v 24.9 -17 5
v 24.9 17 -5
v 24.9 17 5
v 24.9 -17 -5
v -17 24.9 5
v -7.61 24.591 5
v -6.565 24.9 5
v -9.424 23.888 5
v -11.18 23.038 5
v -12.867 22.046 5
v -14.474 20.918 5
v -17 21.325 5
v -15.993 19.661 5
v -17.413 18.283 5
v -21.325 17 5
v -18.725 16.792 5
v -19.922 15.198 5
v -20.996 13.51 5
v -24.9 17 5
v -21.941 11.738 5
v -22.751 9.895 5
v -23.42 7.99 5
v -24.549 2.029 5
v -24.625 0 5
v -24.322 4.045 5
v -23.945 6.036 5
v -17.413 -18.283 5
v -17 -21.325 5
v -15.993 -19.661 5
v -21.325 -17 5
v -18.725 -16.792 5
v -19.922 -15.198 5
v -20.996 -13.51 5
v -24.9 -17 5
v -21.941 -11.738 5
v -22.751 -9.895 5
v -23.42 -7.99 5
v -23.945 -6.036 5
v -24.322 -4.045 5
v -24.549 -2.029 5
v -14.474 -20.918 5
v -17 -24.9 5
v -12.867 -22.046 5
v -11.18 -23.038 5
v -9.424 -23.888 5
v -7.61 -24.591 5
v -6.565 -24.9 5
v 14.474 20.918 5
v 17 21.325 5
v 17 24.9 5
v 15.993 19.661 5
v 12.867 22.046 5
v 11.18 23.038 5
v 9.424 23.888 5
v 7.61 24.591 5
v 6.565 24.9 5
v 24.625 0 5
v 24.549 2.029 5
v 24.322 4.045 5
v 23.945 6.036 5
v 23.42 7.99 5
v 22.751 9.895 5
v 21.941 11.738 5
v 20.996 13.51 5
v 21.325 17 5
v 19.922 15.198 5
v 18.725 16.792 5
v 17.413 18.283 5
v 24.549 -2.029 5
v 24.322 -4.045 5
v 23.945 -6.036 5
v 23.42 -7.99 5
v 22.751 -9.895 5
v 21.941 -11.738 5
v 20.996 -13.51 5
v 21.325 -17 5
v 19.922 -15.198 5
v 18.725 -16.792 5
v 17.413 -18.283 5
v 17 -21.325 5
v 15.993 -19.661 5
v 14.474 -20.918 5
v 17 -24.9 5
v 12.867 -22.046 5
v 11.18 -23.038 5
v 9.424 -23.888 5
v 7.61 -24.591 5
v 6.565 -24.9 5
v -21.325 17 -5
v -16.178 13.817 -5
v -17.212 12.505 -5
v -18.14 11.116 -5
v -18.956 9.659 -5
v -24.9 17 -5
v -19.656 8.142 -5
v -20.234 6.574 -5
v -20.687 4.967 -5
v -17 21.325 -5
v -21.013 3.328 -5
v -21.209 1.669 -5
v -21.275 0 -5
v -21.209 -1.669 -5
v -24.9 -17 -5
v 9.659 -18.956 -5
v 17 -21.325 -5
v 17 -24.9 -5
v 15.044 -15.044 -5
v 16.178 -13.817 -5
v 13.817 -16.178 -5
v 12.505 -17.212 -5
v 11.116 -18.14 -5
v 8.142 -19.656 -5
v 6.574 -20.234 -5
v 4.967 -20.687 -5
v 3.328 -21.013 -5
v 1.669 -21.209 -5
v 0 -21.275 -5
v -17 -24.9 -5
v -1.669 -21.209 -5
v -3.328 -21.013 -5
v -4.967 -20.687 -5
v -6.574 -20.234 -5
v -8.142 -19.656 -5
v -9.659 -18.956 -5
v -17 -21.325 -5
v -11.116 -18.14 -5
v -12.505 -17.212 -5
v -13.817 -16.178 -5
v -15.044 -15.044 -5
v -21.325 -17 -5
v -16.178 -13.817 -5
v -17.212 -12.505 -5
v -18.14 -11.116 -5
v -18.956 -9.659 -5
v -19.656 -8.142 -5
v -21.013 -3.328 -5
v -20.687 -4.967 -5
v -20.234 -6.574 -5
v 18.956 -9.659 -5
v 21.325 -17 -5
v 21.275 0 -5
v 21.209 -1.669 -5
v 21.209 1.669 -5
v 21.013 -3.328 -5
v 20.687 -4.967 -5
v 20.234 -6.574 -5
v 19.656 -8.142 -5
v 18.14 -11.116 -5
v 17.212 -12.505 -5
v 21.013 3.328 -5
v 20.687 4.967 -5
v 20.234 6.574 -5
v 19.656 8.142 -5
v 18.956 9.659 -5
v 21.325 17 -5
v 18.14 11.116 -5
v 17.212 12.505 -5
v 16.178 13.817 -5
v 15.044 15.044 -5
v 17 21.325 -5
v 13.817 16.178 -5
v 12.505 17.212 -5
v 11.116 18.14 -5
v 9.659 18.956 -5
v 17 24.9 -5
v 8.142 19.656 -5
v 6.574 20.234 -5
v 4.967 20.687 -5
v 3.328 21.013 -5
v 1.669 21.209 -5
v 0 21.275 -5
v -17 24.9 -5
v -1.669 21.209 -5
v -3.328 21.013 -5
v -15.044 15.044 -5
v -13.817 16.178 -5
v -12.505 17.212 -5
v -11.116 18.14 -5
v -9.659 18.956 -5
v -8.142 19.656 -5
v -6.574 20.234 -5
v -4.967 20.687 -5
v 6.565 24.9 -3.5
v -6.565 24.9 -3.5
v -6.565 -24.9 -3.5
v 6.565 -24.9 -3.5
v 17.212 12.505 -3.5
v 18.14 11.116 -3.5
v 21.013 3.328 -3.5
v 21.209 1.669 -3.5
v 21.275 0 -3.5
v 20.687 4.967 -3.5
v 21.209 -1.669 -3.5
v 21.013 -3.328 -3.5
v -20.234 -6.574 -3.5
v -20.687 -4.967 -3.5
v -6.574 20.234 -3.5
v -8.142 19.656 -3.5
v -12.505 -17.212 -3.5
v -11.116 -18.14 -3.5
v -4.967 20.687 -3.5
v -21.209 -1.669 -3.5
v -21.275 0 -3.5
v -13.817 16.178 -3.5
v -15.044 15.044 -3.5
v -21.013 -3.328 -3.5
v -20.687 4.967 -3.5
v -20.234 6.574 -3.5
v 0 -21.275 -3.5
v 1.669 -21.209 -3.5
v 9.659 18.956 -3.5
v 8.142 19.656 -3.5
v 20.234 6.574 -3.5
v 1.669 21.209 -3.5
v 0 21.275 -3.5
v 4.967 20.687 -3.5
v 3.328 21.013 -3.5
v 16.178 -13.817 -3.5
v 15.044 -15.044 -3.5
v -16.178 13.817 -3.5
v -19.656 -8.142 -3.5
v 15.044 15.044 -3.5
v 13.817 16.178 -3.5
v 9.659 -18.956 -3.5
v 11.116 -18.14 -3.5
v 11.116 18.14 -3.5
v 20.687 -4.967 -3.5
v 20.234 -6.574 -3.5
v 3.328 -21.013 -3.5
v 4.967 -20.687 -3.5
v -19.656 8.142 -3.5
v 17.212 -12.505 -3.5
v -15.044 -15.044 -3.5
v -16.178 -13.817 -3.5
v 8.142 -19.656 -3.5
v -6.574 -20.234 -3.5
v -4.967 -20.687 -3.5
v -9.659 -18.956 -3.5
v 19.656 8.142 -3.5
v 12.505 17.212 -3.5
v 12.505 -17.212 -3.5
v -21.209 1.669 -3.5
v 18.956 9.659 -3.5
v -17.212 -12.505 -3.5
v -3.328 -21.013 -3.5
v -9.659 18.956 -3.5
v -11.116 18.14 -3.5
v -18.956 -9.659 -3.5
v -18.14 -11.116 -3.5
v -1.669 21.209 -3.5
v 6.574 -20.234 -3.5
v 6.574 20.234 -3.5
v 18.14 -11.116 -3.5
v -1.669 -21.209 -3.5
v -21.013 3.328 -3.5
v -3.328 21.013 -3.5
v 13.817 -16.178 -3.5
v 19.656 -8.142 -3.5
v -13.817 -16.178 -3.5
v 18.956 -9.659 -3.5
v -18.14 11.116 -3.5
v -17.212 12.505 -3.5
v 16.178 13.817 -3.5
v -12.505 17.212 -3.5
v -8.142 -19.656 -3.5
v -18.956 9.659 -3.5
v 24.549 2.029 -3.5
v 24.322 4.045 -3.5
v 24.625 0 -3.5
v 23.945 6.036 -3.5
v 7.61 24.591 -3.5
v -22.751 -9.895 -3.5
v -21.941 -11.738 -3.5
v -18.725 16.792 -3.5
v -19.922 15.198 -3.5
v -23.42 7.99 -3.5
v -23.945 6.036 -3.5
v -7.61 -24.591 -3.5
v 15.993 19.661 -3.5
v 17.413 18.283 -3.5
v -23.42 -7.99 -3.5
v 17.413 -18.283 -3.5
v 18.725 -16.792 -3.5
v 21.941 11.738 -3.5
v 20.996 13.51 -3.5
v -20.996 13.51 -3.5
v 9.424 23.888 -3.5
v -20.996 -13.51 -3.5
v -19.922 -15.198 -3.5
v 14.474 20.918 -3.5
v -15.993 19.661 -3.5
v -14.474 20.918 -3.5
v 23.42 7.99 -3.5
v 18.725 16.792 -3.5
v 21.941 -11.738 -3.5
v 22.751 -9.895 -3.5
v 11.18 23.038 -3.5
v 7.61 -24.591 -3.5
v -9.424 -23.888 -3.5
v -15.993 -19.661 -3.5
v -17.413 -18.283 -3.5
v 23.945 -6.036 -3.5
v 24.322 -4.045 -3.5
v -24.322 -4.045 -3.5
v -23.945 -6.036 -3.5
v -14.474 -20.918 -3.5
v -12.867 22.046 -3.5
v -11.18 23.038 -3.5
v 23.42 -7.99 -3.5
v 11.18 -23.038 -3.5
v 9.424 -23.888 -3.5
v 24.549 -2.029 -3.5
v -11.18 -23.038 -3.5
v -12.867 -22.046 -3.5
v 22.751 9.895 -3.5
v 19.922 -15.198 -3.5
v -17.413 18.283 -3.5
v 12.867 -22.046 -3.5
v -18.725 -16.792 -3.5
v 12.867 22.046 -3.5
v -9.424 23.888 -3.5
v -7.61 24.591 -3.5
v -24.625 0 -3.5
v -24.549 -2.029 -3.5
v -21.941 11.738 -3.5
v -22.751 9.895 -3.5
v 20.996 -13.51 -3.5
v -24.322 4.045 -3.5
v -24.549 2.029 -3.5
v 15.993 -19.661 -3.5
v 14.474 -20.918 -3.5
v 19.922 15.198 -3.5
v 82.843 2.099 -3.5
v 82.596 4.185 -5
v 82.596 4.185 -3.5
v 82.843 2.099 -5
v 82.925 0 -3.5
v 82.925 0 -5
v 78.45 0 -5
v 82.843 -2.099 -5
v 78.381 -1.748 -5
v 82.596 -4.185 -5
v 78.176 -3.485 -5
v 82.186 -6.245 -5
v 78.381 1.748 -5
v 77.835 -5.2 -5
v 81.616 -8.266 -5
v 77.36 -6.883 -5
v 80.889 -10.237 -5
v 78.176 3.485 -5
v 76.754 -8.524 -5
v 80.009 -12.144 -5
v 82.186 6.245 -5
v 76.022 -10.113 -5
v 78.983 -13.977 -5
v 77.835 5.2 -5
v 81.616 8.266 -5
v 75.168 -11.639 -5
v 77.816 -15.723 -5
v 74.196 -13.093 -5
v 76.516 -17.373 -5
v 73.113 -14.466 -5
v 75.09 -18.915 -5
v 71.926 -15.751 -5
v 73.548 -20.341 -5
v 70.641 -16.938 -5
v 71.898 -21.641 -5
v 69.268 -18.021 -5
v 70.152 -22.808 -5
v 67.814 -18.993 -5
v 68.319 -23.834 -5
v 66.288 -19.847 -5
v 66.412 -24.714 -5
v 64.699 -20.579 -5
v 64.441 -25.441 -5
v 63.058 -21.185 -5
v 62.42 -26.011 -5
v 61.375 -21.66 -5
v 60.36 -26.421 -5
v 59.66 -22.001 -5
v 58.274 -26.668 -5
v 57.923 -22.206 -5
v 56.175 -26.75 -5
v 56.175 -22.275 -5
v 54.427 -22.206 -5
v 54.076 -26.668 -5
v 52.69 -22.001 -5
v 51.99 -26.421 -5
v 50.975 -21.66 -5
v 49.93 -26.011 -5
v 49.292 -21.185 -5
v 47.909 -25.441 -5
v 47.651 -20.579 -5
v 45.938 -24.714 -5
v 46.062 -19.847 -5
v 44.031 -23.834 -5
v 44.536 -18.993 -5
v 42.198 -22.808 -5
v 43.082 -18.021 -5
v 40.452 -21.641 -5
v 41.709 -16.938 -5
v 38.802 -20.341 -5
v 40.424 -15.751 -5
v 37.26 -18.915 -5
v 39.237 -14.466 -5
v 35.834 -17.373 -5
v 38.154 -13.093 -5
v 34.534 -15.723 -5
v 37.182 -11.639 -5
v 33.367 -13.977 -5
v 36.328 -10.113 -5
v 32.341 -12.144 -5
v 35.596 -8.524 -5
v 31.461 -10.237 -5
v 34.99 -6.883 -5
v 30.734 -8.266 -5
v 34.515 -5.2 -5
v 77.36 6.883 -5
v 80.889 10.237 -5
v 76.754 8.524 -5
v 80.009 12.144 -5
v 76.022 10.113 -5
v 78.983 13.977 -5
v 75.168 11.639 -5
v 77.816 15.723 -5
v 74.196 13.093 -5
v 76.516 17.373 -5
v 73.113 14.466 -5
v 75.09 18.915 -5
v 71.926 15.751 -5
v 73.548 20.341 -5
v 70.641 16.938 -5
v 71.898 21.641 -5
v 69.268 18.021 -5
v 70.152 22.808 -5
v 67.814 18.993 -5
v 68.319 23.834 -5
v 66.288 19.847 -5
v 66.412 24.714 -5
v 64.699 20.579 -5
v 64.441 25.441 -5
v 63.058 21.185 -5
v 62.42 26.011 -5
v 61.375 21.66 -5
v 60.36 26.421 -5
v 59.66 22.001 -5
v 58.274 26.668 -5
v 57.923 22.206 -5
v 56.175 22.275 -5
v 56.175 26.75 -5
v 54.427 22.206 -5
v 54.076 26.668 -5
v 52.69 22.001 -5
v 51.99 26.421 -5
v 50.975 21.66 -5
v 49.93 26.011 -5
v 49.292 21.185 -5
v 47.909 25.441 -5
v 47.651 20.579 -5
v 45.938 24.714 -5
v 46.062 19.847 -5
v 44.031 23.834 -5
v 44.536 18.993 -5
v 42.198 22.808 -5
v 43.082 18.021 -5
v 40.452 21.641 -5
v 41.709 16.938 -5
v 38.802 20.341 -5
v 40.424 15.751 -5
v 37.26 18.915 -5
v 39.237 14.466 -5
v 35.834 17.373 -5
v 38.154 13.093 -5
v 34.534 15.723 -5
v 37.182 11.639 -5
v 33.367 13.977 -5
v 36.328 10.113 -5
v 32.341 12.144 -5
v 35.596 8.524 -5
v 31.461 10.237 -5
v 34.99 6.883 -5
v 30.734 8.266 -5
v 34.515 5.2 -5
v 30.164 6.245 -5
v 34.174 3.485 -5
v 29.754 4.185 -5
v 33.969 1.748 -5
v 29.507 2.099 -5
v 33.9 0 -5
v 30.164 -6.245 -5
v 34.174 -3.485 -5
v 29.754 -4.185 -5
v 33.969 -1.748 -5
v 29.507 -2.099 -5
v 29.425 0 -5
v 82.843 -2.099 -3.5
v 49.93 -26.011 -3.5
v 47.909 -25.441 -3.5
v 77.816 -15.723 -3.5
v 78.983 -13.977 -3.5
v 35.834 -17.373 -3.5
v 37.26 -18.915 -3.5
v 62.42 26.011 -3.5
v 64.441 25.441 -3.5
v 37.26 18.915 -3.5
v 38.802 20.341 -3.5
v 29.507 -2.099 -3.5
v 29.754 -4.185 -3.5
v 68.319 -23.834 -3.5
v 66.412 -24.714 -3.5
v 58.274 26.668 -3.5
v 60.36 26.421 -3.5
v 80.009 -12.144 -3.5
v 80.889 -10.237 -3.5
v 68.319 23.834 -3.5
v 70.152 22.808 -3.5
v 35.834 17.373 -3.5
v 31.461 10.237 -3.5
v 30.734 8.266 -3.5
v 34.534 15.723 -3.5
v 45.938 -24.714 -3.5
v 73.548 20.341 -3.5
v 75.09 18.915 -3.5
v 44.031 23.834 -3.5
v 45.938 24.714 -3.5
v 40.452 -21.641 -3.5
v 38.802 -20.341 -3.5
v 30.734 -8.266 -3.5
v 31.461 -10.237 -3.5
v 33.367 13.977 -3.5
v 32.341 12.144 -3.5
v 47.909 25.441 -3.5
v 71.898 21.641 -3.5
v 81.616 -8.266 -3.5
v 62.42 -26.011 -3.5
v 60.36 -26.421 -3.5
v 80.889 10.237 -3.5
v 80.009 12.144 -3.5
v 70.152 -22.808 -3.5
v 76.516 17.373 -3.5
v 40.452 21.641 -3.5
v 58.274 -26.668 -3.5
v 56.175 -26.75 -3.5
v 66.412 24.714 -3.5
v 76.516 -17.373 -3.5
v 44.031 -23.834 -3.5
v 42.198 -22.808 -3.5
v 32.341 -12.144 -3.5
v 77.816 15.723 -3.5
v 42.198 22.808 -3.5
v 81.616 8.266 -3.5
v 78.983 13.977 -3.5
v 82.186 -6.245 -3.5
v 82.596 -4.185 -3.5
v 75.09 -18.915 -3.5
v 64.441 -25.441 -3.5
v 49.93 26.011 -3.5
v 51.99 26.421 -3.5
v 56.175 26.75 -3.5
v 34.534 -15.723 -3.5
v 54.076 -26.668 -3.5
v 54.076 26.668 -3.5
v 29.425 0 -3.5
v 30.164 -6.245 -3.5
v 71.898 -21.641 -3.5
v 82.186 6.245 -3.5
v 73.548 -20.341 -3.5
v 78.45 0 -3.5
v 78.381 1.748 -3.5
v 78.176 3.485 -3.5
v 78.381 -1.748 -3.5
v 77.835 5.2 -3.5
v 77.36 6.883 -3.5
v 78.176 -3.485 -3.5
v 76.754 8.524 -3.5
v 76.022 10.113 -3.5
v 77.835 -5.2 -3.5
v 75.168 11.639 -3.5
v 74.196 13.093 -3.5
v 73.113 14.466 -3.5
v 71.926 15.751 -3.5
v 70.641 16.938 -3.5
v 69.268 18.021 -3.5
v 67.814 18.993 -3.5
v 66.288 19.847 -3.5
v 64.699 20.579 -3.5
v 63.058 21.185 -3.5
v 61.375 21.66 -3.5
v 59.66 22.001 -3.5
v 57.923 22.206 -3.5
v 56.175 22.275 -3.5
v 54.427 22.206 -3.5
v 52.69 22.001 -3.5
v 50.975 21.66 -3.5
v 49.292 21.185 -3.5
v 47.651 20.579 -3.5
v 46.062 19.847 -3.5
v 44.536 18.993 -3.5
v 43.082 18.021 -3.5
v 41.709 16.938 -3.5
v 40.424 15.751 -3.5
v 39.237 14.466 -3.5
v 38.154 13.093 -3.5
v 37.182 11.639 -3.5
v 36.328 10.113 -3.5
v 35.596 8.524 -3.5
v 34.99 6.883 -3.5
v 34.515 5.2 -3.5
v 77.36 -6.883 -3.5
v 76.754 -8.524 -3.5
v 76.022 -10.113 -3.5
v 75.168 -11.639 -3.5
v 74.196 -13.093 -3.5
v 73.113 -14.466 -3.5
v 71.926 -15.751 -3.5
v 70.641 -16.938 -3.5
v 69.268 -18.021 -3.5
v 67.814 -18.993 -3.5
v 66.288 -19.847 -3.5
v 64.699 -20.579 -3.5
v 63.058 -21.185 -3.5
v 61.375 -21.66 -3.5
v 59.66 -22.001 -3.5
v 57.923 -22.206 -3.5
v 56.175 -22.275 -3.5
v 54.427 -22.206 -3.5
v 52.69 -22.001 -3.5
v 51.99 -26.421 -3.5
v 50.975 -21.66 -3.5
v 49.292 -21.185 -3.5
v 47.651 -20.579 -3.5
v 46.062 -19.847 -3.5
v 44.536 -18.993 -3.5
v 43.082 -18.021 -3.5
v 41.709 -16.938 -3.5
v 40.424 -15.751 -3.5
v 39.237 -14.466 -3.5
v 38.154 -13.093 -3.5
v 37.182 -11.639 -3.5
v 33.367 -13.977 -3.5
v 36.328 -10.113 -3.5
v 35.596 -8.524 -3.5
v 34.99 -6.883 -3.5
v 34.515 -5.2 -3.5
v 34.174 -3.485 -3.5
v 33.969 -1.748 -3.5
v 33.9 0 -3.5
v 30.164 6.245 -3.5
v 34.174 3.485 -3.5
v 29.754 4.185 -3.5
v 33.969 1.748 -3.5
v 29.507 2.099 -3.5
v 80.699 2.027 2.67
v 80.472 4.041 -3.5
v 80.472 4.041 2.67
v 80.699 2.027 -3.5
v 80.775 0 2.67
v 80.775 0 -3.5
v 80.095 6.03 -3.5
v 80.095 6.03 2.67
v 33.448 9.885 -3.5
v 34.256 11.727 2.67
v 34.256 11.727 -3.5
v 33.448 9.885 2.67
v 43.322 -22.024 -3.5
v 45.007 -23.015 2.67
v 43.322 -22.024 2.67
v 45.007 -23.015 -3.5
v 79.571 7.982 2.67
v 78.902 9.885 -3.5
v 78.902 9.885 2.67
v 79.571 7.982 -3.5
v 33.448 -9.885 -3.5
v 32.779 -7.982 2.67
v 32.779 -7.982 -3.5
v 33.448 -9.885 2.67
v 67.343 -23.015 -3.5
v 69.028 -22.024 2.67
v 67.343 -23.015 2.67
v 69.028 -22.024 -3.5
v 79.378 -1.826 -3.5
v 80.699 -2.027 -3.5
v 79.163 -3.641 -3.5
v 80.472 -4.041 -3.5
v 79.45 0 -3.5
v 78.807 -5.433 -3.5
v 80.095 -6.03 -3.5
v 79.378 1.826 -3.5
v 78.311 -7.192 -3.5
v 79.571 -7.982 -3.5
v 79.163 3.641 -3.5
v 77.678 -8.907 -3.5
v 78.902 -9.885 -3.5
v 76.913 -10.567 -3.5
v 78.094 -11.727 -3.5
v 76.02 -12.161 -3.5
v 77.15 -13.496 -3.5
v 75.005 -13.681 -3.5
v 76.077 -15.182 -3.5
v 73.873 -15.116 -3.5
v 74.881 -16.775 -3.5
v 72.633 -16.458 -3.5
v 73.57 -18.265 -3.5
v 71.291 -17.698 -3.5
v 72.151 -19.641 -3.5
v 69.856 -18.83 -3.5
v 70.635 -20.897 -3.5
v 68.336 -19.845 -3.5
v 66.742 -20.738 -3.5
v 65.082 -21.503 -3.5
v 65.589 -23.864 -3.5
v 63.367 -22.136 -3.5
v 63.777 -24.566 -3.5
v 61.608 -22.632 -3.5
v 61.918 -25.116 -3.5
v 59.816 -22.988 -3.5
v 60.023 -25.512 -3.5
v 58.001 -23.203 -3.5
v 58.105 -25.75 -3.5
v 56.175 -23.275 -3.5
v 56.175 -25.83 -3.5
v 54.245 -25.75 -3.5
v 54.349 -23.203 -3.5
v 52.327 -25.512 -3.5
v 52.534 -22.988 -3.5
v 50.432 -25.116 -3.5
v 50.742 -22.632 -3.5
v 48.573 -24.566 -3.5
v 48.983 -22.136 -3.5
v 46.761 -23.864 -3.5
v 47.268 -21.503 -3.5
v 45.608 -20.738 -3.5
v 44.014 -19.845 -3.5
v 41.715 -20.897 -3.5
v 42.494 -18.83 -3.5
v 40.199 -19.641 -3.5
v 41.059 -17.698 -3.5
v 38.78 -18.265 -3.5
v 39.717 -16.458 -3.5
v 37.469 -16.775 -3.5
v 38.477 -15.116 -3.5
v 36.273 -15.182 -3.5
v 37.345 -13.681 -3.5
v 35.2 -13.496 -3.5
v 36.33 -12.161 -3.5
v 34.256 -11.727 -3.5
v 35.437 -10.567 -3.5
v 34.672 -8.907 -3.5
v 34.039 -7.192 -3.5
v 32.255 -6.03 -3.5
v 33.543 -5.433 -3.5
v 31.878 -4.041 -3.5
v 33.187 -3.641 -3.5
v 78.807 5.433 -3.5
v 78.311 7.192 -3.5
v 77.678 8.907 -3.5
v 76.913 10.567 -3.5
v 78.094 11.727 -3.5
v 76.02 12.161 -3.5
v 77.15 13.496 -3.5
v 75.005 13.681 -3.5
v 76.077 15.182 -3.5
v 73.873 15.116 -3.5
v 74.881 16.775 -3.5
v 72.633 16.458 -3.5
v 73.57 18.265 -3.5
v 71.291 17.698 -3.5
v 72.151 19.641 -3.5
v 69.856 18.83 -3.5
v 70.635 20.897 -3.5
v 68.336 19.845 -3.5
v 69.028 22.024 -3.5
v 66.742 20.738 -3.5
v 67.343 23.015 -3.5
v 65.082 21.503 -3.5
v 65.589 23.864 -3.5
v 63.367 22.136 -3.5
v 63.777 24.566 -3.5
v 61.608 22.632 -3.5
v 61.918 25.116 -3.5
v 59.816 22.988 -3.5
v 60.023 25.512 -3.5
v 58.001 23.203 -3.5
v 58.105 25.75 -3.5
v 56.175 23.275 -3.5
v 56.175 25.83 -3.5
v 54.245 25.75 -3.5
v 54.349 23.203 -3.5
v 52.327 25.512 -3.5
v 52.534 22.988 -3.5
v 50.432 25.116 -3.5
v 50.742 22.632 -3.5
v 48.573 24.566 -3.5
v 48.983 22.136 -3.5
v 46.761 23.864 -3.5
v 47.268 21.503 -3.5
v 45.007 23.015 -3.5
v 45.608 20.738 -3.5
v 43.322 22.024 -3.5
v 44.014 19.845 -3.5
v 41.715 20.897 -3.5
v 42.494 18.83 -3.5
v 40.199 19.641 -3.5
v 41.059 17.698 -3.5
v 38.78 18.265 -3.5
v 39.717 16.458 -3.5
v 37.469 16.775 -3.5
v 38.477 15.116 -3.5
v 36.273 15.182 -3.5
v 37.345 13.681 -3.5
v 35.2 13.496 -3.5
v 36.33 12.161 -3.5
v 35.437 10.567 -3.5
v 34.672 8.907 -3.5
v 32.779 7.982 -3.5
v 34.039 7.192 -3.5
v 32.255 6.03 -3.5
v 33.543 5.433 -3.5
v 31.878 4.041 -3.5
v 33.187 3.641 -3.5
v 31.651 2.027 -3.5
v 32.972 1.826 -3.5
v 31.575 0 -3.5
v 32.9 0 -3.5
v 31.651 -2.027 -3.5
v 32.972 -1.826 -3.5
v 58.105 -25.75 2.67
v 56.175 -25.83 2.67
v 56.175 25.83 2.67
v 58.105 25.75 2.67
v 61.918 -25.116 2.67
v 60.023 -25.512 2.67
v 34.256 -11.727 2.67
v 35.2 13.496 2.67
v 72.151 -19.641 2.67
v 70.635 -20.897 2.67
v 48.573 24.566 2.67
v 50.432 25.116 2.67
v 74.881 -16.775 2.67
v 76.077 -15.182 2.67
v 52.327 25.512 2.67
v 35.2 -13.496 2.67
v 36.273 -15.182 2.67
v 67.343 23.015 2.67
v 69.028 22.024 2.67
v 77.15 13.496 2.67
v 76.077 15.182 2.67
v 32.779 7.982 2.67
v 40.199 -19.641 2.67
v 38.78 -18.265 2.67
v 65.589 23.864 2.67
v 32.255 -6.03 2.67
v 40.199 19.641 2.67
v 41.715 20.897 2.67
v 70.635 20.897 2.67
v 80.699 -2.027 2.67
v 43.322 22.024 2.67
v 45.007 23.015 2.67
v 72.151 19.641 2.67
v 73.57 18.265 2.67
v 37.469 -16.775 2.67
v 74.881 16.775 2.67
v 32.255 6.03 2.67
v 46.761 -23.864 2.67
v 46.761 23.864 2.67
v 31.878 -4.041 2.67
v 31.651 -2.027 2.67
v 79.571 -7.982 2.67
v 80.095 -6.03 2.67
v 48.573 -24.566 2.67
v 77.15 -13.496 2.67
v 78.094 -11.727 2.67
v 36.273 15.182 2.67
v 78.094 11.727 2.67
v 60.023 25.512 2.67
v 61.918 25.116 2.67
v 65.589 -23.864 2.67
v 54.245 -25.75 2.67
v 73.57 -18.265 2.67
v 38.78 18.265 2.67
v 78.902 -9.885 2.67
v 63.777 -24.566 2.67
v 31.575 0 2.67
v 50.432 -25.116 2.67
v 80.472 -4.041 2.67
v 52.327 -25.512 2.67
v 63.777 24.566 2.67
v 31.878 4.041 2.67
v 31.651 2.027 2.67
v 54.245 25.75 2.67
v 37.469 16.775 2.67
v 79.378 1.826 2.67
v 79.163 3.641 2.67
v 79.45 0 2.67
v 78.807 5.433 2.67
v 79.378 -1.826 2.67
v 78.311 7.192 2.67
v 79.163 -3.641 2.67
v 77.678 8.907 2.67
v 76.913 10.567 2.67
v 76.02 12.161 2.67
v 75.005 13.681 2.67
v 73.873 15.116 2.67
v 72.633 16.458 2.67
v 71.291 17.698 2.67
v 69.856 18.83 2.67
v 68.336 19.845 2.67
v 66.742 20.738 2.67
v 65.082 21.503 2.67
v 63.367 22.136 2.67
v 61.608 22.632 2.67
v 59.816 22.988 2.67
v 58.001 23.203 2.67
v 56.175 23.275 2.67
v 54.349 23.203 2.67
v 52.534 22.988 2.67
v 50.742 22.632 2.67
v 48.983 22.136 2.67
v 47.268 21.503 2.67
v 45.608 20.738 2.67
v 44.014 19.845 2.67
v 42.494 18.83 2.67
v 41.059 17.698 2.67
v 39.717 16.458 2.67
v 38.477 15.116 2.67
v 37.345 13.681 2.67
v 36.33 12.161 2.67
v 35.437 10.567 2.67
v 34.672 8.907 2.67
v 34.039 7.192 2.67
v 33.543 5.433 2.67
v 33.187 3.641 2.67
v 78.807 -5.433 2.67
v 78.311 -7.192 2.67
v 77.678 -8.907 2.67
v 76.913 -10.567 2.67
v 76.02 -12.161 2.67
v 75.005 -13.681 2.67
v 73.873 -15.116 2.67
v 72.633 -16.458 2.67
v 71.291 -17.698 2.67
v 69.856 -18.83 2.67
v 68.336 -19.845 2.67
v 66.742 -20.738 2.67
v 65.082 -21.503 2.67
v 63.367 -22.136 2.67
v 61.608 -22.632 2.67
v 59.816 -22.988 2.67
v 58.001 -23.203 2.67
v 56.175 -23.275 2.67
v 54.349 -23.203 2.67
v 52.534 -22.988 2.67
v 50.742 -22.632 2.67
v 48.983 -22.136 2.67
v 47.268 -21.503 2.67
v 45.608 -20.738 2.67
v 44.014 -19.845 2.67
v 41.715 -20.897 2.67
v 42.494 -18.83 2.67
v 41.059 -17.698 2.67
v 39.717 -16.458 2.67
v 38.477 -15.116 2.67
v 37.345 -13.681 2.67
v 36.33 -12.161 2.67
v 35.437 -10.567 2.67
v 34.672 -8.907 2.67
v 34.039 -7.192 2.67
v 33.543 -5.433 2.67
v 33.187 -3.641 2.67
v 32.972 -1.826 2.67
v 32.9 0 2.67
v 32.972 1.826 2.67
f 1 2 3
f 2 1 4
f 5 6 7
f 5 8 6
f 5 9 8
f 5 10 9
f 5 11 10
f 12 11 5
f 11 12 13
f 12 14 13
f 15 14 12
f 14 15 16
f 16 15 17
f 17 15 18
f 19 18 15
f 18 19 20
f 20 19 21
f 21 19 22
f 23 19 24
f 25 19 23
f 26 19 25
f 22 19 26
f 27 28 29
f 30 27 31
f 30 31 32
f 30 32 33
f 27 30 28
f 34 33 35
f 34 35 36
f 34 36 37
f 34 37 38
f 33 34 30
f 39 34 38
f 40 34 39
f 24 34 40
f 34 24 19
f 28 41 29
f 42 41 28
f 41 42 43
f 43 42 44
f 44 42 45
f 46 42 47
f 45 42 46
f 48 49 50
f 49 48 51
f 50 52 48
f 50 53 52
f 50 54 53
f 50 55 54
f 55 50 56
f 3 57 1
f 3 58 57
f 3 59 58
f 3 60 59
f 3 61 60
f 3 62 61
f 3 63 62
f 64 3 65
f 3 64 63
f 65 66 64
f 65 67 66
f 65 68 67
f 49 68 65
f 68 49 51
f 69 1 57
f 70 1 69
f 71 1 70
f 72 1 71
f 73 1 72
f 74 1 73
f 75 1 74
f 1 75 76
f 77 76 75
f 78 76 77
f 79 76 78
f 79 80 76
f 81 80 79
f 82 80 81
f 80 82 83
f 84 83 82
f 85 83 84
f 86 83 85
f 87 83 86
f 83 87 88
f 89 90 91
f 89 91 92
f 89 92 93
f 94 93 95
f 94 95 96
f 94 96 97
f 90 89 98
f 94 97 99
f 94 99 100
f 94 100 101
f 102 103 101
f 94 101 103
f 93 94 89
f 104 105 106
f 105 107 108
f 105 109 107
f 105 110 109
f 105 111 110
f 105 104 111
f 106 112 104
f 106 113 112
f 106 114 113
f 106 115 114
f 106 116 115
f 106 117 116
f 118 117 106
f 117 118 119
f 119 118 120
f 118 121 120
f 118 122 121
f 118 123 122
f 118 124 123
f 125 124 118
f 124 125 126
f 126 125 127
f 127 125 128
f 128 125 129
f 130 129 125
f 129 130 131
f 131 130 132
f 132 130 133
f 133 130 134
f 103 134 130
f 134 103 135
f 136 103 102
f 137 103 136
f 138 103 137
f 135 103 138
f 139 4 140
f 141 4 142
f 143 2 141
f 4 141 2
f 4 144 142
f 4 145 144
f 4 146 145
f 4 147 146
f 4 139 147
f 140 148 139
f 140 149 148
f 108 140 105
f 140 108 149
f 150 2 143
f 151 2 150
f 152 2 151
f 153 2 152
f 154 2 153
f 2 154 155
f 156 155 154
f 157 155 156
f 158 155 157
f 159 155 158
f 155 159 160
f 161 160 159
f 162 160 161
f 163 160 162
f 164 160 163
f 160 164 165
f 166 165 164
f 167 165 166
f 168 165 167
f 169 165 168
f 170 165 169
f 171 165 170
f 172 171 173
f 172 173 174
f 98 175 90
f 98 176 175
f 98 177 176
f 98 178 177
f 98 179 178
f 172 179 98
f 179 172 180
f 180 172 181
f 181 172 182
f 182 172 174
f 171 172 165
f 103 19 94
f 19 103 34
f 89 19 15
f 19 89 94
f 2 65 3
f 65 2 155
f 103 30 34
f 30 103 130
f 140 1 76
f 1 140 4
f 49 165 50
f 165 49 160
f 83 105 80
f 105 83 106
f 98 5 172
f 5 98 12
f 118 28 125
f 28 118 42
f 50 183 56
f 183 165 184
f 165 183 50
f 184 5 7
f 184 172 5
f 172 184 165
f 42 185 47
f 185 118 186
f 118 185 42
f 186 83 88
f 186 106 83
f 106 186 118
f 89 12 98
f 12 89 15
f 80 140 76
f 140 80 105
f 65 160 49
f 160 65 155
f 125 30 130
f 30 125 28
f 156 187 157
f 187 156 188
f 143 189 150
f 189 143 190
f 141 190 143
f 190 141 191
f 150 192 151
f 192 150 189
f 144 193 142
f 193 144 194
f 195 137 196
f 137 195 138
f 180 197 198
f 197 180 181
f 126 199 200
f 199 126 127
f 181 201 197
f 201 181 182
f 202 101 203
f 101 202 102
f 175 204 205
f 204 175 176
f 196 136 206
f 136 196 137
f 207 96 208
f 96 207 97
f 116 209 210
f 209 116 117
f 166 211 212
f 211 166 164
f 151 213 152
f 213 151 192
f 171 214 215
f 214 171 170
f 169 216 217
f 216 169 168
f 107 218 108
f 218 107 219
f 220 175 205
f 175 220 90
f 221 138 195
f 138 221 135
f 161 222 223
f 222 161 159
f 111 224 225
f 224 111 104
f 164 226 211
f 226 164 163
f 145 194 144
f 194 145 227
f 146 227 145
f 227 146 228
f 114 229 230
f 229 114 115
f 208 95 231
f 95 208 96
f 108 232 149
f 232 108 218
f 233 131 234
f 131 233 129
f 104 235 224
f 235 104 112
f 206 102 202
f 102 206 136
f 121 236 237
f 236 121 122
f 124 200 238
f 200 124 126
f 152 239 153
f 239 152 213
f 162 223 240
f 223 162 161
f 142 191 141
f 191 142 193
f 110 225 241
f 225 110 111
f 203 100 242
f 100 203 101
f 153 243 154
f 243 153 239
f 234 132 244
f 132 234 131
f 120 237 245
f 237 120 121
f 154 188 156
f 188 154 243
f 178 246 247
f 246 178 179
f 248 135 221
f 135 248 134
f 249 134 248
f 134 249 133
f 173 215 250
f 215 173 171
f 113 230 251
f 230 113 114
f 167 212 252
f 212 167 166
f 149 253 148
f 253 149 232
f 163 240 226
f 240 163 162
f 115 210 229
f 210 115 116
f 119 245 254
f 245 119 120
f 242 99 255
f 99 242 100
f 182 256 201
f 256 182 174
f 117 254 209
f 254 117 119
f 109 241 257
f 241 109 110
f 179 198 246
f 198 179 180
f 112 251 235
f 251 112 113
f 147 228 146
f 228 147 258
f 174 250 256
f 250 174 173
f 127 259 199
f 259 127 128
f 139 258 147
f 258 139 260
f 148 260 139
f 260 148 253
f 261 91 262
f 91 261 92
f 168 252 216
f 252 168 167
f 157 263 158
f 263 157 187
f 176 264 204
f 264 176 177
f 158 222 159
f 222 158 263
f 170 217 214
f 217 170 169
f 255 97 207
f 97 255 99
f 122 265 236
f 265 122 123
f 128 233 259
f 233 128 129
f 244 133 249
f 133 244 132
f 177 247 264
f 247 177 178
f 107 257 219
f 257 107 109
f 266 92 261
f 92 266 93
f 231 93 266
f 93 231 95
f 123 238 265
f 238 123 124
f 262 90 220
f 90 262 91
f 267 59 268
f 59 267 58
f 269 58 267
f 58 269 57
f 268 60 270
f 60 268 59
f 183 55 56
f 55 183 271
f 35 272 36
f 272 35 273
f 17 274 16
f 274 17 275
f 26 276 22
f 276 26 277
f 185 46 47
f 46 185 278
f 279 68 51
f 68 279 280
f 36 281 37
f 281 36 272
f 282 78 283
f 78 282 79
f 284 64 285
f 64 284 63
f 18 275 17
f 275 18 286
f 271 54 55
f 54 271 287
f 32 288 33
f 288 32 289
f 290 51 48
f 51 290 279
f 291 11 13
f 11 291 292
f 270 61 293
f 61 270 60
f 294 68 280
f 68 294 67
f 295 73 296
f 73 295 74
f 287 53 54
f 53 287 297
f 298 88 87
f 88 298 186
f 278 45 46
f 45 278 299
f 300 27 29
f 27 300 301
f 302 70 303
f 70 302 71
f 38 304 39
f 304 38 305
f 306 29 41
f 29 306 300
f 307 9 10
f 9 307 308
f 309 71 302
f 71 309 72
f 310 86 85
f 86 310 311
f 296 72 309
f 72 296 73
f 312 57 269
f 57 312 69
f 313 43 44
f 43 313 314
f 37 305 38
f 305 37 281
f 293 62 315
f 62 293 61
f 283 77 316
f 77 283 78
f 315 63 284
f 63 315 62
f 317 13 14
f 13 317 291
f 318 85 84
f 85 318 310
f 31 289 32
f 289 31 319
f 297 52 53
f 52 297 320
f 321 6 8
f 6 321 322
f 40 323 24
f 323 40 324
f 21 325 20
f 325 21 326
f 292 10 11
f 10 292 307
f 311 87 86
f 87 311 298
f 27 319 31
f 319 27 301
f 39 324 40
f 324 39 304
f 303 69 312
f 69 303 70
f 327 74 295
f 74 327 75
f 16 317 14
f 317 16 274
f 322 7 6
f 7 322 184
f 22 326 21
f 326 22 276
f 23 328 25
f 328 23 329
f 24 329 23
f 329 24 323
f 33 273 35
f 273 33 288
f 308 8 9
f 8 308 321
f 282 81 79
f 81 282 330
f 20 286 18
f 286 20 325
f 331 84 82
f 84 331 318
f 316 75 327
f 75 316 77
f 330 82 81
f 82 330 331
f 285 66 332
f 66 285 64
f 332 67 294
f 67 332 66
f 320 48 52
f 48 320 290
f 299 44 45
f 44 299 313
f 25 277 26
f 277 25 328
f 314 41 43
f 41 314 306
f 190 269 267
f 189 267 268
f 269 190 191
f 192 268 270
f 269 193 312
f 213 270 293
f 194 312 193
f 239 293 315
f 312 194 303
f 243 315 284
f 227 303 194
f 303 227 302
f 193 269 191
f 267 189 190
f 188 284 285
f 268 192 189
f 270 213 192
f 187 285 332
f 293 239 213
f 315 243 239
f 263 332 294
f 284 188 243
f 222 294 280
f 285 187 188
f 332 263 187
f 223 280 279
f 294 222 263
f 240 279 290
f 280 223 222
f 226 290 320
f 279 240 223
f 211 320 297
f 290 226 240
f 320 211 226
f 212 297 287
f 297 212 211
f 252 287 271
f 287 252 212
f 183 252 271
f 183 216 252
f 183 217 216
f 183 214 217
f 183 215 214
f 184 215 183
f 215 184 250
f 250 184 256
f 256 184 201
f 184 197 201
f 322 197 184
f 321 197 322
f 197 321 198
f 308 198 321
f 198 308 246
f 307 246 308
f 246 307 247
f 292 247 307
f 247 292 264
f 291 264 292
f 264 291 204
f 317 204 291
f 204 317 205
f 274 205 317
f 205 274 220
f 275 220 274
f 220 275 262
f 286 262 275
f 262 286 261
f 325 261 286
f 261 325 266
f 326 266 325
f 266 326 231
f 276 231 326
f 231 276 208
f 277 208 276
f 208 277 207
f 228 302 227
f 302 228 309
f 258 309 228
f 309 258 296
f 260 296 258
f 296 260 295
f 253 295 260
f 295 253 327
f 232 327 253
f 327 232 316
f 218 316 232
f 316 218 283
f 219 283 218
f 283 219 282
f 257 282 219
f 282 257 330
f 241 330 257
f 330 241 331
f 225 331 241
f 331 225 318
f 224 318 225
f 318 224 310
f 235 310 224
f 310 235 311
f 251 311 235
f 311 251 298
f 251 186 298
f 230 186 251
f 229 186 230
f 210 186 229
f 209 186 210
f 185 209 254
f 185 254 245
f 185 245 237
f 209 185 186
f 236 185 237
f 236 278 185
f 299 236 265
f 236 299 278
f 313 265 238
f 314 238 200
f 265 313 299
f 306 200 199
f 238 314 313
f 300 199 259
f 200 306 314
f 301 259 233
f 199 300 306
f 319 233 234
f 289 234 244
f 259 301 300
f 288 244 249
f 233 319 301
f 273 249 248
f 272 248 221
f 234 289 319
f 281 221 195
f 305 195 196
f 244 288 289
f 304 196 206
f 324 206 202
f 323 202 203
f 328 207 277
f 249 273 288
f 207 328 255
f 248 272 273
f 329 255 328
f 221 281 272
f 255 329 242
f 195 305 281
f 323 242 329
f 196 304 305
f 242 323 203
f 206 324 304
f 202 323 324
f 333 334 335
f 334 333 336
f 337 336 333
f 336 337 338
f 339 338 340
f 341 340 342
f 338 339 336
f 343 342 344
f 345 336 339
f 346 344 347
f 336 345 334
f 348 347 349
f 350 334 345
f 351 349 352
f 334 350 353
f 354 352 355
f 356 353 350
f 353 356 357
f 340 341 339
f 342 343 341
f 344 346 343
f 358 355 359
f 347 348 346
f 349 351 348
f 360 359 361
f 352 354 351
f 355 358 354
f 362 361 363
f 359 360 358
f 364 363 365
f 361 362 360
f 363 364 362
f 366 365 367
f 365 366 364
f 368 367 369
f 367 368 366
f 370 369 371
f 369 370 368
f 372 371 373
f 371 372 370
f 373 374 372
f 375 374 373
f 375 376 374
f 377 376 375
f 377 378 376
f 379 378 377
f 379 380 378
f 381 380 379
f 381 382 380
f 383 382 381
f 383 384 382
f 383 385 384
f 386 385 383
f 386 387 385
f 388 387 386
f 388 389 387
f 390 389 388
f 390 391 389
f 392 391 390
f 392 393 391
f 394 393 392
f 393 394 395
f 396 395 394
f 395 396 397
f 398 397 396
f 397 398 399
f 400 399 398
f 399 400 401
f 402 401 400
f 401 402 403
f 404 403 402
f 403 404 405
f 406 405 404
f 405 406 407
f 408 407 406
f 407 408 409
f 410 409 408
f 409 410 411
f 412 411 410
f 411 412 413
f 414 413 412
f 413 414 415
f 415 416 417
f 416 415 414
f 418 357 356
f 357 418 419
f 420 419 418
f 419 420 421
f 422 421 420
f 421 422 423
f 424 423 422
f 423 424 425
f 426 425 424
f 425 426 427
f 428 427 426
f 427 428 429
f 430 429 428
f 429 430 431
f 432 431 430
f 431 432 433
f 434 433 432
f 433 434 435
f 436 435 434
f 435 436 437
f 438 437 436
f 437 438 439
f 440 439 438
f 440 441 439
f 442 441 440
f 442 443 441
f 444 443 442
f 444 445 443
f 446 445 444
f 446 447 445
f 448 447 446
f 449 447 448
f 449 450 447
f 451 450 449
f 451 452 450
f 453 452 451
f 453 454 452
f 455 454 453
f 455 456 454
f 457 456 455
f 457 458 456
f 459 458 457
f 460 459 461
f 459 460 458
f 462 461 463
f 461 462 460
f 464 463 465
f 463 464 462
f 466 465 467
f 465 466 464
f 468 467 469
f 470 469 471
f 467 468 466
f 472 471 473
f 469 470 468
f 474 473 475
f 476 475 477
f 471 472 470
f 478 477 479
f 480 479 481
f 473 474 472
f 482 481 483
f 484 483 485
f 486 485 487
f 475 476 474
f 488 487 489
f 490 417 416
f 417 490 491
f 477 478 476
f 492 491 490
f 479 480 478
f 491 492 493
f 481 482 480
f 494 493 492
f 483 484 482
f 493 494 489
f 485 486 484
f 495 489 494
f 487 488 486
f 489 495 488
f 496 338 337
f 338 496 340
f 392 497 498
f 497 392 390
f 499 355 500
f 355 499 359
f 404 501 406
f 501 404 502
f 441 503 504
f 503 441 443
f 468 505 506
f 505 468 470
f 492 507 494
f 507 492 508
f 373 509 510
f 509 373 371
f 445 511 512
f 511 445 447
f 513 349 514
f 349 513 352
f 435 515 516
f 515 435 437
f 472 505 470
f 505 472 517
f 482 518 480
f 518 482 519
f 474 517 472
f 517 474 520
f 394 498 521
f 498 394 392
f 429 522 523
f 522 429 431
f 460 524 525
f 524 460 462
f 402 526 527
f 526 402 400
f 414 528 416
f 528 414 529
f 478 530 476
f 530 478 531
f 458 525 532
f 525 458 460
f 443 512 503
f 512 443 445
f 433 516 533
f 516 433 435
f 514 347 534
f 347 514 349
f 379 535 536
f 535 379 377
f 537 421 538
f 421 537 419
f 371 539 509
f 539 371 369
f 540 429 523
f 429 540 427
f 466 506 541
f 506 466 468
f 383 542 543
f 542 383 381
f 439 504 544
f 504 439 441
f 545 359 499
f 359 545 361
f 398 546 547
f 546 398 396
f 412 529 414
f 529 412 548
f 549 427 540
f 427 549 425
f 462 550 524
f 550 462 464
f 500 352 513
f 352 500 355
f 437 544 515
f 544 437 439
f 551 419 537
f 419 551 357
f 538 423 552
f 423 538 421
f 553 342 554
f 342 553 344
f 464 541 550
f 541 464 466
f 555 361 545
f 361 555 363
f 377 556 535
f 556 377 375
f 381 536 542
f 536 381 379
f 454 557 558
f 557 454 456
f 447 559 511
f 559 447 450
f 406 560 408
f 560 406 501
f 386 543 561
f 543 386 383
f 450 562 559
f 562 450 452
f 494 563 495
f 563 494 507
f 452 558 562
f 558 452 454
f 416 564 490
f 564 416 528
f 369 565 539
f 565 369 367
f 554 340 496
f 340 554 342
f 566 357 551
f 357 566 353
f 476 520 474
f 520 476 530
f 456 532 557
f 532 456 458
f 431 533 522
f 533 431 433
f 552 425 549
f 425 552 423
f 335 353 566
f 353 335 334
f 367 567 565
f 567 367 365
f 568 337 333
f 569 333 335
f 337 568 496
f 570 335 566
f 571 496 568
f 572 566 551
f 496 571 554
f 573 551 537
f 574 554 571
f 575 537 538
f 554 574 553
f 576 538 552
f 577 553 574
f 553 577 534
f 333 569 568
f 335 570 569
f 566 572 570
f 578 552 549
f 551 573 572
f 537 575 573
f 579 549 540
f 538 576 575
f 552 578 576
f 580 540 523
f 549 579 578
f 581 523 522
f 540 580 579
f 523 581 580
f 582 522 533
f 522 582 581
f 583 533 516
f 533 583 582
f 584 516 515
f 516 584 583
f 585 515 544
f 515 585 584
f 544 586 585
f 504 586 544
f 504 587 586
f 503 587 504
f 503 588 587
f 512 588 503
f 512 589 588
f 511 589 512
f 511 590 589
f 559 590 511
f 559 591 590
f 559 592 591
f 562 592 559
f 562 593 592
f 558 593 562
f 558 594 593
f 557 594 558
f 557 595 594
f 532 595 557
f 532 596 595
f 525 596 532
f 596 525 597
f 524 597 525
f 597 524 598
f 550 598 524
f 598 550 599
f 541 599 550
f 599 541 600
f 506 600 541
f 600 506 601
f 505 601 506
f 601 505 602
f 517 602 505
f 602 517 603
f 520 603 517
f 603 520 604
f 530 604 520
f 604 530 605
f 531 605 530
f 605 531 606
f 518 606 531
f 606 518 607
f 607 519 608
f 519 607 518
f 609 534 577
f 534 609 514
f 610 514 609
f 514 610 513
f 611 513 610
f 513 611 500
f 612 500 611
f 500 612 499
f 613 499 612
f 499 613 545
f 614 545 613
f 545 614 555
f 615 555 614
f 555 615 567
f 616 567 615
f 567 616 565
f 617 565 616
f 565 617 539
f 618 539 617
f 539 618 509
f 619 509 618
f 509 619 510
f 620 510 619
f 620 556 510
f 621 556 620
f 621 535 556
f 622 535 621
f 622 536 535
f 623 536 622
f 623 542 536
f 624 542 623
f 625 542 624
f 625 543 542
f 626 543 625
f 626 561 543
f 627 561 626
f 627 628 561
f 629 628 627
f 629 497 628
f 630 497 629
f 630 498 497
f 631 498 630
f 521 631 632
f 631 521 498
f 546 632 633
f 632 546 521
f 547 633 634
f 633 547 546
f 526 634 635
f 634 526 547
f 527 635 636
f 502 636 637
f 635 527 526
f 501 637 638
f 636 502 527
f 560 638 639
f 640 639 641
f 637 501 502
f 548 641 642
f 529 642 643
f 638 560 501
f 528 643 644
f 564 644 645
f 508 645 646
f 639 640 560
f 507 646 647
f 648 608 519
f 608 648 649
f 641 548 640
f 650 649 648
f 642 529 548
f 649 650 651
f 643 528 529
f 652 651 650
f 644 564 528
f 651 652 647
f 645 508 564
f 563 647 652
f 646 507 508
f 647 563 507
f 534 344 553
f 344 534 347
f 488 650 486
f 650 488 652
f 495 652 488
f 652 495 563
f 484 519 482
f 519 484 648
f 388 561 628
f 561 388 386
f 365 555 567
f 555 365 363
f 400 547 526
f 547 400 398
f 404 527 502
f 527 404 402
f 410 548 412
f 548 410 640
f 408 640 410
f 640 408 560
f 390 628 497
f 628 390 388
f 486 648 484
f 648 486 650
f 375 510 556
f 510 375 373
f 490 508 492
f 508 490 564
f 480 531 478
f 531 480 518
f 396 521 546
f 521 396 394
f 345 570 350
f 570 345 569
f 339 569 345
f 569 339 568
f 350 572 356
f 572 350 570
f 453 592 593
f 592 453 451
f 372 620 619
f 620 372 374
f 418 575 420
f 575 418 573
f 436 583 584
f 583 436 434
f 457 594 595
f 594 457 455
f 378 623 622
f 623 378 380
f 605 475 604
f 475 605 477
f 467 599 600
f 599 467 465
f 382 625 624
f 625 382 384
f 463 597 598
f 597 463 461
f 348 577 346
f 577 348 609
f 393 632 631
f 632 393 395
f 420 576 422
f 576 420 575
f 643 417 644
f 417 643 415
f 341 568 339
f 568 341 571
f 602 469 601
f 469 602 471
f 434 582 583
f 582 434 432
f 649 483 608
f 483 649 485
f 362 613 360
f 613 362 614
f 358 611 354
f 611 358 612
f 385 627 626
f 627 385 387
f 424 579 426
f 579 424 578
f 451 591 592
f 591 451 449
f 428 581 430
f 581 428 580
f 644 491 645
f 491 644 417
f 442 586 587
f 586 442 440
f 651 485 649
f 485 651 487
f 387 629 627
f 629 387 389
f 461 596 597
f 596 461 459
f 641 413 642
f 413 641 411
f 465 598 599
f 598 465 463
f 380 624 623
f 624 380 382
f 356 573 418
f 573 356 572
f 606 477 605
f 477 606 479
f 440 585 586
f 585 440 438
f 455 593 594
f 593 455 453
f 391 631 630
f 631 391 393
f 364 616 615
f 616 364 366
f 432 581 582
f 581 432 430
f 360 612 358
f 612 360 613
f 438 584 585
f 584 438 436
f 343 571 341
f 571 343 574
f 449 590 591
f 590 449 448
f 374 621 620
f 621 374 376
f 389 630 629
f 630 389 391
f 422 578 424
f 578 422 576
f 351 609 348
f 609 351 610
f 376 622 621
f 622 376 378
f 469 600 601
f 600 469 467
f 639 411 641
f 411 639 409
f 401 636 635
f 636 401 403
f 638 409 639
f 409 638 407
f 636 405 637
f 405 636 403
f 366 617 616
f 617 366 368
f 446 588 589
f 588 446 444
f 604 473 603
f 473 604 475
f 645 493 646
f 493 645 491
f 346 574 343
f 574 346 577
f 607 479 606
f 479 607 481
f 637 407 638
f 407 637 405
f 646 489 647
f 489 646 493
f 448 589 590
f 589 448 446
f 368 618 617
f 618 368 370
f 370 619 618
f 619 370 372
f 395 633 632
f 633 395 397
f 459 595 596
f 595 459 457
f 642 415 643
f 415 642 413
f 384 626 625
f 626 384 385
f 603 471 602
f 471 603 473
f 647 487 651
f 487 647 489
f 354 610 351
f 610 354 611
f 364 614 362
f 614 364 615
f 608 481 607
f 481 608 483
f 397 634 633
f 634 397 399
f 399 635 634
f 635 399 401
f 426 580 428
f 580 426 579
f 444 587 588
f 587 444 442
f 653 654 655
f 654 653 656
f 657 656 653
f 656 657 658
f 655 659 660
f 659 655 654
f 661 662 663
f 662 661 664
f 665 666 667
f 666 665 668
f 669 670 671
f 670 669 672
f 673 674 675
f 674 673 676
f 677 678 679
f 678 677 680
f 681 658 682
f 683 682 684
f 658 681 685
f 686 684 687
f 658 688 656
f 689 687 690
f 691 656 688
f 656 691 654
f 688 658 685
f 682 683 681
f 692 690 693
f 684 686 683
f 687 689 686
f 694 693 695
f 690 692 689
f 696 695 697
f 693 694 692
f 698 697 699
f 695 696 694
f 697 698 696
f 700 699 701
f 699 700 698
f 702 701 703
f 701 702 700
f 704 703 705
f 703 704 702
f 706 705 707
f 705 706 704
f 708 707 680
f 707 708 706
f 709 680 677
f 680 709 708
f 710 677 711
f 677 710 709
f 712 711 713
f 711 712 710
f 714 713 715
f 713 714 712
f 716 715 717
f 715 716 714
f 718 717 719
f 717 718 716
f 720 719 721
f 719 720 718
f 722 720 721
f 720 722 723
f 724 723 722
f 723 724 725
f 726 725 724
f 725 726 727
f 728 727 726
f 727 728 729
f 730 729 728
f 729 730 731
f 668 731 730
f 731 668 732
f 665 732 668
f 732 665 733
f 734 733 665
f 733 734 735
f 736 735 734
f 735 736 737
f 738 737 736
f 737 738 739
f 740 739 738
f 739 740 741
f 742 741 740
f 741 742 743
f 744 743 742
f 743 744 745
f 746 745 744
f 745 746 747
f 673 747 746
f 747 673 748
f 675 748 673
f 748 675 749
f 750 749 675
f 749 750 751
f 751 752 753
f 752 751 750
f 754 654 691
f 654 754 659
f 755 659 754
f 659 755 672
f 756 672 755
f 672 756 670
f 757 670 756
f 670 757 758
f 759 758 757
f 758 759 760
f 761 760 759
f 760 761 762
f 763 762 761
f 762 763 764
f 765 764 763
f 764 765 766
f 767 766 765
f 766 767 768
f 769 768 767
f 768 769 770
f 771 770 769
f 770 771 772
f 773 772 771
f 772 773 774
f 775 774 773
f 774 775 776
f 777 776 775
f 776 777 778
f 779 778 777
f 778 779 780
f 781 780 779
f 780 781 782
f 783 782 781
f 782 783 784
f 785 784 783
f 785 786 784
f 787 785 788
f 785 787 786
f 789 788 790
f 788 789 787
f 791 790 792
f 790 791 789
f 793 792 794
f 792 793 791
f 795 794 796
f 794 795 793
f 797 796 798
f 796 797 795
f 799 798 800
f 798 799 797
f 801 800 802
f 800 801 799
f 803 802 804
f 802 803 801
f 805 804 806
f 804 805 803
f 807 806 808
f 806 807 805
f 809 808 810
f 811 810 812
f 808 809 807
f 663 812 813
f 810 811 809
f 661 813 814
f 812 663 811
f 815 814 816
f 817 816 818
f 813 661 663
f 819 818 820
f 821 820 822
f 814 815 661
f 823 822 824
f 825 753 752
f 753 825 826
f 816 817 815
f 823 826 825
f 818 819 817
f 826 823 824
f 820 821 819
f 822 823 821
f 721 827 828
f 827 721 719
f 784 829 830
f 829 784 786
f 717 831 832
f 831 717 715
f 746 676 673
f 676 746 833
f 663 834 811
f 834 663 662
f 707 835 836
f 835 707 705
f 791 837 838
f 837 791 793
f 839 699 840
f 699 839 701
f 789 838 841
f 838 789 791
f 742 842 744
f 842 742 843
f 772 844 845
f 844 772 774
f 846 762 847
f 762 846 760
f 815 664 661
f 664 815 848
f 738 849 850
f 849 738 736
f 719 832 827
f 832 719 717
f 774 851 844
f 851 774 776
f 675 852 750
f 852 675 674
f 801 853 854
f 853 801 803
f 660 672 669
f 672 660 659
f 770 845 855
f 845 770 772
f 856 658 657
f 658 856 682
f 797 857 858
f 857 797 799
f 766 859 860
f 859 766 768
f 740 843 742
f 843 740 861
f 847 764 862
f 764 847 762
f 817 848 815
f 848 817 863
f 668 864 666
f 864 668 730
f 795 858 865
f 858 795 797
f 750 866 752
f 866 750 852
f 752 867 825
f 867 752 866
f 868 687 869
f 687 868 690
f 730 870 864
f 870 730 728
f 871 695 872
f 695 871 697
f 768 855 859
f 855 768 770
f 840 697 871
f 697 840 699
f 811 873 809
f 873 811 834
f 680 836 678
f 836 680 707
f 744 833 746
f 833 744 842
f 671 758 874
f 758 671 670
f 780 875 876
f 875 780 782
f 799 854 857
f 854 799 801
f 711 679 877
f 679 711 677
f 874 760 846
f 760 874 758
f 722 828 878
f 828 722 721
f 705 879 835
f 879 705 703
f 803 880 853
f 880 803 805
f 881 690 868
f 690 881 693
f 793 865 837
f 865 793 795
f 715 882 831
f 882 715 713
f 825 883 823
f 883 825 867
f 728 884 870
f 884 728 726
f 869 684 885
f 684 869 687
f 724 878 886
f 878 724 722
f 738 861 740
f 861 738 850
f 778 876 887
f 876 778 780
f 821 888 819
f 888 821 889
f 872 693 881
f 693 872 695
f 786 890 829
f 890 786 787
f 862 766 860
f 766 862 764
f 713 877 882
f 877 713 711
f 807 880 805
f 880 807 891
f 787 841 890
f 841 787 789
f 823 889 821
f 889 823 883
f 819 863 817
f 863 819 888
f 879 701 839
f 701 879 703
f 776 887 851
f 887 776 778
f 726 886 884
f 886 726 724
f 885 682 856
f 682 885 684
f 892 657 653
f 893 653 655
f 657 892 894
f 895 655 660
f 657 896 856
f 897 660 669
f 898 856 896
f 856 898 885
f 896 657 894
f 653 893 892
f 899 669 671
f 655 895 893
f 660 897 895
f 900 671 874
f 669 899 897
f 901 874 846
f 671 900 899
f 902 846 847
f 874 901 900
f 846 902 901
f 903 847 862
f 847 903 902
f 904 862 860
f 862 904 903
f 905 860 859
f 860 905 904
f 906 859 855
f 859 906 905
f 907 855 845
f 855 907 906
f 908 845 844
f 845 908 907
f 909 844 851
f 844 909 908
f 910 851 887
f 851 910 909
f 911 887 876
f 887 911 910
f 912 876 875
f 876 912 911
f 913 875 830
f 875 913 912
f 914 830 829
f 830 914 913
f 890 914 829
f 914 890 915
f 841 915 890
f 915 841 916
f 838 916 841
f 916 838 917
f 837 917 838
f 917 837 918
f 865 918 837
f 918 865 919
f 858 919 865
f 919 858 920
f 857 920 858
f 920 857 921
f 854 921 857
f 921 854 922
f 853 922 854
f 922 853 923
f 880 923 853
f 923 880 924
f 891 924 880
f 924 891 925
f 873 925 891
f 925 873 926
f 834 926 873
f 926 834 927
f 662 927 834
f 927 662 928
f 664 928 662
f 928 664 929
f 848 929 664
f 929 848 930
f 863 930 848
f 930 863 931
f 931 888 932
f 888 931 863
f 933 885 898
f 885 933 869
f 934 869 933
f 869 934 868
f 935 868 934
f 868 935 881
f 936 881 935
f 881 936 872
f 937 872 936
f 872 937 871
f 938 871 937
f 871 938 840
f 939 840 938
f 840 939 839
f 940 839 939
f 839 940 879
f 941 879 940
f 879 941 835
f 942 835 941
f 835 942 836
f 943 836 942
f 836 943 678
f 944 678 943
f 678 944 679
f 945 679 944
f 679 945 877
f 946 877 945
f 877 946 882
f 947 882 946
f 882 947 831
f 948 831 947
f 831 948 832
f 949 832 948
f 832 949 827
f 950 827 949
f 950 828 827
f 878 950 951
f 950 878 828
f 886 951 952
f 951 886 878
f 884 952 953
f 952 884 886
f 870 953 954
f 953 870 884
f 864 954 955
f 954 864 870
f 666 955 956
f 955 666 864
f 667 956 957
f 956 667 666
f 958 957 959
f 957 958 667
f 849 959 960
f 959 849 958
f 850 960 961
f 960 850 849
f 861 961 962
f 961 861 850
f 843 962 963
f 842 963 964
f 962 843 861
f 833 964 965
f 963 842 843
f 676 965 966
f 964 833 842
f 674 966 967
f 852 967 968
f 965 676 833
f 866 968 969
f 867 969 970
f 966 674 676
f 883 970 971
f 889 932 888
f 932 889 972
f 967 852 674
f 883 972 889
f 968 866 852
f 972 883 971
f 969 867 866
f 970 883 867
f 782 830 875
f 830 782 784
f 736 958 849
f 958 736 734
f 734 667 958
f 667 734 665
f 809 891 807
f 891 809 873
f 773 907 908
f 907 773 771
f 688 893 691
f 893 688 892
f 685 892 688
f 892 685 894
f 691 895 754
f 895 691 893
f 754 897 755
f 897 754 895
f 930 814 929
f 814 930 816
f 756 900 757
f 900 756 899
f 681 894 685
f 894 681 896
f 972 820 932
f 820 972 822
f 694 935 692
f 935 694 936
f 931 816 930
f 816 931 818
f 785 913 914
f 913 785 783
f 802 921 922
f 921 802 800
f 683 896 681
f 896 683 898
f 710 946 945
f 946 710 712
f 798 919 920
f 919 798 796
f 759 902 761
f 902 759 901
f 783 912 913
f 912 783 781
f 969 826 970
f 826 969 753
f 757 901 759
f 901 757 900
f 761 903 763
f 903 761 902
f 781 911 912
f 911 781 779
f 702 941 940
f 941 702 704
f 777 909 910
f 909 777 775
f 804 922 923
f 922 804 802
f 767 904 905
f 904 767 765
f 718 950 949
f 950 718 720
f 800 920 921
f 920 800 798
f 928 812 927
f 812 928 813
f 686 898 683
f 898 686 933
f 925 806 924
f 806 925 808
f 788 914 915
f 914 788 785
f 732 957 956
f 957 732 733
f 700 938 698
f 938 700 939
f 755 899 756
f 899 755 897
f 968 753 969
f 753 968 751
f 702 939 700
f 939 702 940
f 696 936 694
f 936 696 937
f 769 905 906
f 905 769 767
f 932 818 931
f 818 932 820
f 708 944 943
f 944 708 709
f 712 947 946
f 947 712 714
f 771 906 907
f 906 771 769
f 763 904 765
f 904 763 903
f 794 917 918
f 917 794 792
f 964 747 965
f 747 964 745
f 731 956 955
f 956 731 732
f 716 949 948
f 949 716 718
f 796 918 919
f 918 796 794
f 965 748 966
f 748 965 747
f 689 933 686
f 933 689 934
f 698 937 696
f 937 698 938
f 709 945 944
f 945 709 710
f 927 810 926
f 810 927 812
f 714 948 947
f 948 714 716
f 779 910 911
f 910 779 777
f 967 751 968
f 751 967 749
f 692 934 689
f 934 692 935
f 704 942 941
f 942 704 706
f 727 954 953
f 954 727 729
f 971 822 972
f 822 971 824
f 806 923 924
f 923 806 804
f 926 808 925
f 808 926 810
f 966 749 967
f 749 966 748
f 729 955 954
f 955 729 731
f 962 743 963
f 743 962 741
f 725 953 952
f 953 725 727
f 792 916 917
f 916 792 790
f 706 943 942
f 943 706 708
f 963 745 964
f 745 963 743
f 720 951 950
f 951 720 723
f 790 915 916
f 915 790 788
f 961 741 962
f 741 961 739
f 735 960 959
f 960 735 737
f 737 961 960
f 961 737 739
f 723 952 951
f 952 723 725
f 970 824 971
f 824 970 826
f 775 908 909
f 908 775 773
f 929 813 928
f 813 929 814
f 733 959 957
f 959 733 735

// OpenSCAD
//Cube insert: Lens holder with clamp - for lenses with big diameter

/* [User Parameters] */
//Lens diameter - measure the diameter of your lens carefully and insert the value in millimetres. The holder can be used for lenses with a diameter from 42 mm to 50 mm.
lens_diameter = 48.55; //[40:0.01:50]
//Edge thickness - measure the thickness of your lens as close to the outer edge as possible.
lens_edge_thickness = 2.33; //[0.5:0.01:10]
// Which part would you like to print?
part = "first"; // [first:Both - Holder AND Clamp,second:Holder ONLY,third:Clamp ONLY]

/* [Hiden] */
$fn = 80;
eps = .002;
a = 49.8;
b = 33.6;
c = 6.28;
d = 53.8;
h = lens_edge_thickness < 4.1 ? 10 : lens_edge_thickness+6; //holder height
h1 = h - 1.5 - lens_edge_thickness; //clamp rims height
t = 1.5; //clamp ring thickness
IM_offset = 0.2;

print_part();

module print_part() {   //choose part to print holder/clamp/both
	if (part == "first") {
		lens_holder();
        lens_clamp();
	} else if (part == "second") {
		lens_holder();
	} else if (part == "third") {
		lens_clamp();
	} 
}
module lens_holder () {
    difference(){
        union() {   //basic insert design
            cube([a,b+2*IM_offset,h], center=true);
            cube([b+2*IM_offset,a,h], center=true);
            rotate(a=[0,0,45]){
                cube([c,d+2*IM_offset,h], center=true);
            }
            rotate(a=[0,0,-45]){
                cube([c,d+2*IM_offset,h], center=true);
            }
        }
        union() {
            cylinder(h+eps,d=lens_diameter-6, center = true); //hole
            translate([0,0,1.5]){
                scale([1,1.05,1])cylinder(h,d=lens_diameter+0.7, center = true); //rim to hold the lens
            }
        }
    } 
}

module lens_clamp() {
    translate([a/2+lens_diameter/2+7,0,-(h-t)/2]){
        difference(){   //bottom ring
            cylinder(t, d=53.5, center = true);
            cylinder(t+eps, d=lens_diameter-4, center = true);
        }
        translate([0,0,+(h1+t)/2]){
            difference(){   //rim
                scale([1,1.05,1])cylinder(h1,d=lens_diameter+0.65, center = true);
                cylinder(h1+eps,d=lens_diameter-2, center = true);
            }
            }
        }
    }
